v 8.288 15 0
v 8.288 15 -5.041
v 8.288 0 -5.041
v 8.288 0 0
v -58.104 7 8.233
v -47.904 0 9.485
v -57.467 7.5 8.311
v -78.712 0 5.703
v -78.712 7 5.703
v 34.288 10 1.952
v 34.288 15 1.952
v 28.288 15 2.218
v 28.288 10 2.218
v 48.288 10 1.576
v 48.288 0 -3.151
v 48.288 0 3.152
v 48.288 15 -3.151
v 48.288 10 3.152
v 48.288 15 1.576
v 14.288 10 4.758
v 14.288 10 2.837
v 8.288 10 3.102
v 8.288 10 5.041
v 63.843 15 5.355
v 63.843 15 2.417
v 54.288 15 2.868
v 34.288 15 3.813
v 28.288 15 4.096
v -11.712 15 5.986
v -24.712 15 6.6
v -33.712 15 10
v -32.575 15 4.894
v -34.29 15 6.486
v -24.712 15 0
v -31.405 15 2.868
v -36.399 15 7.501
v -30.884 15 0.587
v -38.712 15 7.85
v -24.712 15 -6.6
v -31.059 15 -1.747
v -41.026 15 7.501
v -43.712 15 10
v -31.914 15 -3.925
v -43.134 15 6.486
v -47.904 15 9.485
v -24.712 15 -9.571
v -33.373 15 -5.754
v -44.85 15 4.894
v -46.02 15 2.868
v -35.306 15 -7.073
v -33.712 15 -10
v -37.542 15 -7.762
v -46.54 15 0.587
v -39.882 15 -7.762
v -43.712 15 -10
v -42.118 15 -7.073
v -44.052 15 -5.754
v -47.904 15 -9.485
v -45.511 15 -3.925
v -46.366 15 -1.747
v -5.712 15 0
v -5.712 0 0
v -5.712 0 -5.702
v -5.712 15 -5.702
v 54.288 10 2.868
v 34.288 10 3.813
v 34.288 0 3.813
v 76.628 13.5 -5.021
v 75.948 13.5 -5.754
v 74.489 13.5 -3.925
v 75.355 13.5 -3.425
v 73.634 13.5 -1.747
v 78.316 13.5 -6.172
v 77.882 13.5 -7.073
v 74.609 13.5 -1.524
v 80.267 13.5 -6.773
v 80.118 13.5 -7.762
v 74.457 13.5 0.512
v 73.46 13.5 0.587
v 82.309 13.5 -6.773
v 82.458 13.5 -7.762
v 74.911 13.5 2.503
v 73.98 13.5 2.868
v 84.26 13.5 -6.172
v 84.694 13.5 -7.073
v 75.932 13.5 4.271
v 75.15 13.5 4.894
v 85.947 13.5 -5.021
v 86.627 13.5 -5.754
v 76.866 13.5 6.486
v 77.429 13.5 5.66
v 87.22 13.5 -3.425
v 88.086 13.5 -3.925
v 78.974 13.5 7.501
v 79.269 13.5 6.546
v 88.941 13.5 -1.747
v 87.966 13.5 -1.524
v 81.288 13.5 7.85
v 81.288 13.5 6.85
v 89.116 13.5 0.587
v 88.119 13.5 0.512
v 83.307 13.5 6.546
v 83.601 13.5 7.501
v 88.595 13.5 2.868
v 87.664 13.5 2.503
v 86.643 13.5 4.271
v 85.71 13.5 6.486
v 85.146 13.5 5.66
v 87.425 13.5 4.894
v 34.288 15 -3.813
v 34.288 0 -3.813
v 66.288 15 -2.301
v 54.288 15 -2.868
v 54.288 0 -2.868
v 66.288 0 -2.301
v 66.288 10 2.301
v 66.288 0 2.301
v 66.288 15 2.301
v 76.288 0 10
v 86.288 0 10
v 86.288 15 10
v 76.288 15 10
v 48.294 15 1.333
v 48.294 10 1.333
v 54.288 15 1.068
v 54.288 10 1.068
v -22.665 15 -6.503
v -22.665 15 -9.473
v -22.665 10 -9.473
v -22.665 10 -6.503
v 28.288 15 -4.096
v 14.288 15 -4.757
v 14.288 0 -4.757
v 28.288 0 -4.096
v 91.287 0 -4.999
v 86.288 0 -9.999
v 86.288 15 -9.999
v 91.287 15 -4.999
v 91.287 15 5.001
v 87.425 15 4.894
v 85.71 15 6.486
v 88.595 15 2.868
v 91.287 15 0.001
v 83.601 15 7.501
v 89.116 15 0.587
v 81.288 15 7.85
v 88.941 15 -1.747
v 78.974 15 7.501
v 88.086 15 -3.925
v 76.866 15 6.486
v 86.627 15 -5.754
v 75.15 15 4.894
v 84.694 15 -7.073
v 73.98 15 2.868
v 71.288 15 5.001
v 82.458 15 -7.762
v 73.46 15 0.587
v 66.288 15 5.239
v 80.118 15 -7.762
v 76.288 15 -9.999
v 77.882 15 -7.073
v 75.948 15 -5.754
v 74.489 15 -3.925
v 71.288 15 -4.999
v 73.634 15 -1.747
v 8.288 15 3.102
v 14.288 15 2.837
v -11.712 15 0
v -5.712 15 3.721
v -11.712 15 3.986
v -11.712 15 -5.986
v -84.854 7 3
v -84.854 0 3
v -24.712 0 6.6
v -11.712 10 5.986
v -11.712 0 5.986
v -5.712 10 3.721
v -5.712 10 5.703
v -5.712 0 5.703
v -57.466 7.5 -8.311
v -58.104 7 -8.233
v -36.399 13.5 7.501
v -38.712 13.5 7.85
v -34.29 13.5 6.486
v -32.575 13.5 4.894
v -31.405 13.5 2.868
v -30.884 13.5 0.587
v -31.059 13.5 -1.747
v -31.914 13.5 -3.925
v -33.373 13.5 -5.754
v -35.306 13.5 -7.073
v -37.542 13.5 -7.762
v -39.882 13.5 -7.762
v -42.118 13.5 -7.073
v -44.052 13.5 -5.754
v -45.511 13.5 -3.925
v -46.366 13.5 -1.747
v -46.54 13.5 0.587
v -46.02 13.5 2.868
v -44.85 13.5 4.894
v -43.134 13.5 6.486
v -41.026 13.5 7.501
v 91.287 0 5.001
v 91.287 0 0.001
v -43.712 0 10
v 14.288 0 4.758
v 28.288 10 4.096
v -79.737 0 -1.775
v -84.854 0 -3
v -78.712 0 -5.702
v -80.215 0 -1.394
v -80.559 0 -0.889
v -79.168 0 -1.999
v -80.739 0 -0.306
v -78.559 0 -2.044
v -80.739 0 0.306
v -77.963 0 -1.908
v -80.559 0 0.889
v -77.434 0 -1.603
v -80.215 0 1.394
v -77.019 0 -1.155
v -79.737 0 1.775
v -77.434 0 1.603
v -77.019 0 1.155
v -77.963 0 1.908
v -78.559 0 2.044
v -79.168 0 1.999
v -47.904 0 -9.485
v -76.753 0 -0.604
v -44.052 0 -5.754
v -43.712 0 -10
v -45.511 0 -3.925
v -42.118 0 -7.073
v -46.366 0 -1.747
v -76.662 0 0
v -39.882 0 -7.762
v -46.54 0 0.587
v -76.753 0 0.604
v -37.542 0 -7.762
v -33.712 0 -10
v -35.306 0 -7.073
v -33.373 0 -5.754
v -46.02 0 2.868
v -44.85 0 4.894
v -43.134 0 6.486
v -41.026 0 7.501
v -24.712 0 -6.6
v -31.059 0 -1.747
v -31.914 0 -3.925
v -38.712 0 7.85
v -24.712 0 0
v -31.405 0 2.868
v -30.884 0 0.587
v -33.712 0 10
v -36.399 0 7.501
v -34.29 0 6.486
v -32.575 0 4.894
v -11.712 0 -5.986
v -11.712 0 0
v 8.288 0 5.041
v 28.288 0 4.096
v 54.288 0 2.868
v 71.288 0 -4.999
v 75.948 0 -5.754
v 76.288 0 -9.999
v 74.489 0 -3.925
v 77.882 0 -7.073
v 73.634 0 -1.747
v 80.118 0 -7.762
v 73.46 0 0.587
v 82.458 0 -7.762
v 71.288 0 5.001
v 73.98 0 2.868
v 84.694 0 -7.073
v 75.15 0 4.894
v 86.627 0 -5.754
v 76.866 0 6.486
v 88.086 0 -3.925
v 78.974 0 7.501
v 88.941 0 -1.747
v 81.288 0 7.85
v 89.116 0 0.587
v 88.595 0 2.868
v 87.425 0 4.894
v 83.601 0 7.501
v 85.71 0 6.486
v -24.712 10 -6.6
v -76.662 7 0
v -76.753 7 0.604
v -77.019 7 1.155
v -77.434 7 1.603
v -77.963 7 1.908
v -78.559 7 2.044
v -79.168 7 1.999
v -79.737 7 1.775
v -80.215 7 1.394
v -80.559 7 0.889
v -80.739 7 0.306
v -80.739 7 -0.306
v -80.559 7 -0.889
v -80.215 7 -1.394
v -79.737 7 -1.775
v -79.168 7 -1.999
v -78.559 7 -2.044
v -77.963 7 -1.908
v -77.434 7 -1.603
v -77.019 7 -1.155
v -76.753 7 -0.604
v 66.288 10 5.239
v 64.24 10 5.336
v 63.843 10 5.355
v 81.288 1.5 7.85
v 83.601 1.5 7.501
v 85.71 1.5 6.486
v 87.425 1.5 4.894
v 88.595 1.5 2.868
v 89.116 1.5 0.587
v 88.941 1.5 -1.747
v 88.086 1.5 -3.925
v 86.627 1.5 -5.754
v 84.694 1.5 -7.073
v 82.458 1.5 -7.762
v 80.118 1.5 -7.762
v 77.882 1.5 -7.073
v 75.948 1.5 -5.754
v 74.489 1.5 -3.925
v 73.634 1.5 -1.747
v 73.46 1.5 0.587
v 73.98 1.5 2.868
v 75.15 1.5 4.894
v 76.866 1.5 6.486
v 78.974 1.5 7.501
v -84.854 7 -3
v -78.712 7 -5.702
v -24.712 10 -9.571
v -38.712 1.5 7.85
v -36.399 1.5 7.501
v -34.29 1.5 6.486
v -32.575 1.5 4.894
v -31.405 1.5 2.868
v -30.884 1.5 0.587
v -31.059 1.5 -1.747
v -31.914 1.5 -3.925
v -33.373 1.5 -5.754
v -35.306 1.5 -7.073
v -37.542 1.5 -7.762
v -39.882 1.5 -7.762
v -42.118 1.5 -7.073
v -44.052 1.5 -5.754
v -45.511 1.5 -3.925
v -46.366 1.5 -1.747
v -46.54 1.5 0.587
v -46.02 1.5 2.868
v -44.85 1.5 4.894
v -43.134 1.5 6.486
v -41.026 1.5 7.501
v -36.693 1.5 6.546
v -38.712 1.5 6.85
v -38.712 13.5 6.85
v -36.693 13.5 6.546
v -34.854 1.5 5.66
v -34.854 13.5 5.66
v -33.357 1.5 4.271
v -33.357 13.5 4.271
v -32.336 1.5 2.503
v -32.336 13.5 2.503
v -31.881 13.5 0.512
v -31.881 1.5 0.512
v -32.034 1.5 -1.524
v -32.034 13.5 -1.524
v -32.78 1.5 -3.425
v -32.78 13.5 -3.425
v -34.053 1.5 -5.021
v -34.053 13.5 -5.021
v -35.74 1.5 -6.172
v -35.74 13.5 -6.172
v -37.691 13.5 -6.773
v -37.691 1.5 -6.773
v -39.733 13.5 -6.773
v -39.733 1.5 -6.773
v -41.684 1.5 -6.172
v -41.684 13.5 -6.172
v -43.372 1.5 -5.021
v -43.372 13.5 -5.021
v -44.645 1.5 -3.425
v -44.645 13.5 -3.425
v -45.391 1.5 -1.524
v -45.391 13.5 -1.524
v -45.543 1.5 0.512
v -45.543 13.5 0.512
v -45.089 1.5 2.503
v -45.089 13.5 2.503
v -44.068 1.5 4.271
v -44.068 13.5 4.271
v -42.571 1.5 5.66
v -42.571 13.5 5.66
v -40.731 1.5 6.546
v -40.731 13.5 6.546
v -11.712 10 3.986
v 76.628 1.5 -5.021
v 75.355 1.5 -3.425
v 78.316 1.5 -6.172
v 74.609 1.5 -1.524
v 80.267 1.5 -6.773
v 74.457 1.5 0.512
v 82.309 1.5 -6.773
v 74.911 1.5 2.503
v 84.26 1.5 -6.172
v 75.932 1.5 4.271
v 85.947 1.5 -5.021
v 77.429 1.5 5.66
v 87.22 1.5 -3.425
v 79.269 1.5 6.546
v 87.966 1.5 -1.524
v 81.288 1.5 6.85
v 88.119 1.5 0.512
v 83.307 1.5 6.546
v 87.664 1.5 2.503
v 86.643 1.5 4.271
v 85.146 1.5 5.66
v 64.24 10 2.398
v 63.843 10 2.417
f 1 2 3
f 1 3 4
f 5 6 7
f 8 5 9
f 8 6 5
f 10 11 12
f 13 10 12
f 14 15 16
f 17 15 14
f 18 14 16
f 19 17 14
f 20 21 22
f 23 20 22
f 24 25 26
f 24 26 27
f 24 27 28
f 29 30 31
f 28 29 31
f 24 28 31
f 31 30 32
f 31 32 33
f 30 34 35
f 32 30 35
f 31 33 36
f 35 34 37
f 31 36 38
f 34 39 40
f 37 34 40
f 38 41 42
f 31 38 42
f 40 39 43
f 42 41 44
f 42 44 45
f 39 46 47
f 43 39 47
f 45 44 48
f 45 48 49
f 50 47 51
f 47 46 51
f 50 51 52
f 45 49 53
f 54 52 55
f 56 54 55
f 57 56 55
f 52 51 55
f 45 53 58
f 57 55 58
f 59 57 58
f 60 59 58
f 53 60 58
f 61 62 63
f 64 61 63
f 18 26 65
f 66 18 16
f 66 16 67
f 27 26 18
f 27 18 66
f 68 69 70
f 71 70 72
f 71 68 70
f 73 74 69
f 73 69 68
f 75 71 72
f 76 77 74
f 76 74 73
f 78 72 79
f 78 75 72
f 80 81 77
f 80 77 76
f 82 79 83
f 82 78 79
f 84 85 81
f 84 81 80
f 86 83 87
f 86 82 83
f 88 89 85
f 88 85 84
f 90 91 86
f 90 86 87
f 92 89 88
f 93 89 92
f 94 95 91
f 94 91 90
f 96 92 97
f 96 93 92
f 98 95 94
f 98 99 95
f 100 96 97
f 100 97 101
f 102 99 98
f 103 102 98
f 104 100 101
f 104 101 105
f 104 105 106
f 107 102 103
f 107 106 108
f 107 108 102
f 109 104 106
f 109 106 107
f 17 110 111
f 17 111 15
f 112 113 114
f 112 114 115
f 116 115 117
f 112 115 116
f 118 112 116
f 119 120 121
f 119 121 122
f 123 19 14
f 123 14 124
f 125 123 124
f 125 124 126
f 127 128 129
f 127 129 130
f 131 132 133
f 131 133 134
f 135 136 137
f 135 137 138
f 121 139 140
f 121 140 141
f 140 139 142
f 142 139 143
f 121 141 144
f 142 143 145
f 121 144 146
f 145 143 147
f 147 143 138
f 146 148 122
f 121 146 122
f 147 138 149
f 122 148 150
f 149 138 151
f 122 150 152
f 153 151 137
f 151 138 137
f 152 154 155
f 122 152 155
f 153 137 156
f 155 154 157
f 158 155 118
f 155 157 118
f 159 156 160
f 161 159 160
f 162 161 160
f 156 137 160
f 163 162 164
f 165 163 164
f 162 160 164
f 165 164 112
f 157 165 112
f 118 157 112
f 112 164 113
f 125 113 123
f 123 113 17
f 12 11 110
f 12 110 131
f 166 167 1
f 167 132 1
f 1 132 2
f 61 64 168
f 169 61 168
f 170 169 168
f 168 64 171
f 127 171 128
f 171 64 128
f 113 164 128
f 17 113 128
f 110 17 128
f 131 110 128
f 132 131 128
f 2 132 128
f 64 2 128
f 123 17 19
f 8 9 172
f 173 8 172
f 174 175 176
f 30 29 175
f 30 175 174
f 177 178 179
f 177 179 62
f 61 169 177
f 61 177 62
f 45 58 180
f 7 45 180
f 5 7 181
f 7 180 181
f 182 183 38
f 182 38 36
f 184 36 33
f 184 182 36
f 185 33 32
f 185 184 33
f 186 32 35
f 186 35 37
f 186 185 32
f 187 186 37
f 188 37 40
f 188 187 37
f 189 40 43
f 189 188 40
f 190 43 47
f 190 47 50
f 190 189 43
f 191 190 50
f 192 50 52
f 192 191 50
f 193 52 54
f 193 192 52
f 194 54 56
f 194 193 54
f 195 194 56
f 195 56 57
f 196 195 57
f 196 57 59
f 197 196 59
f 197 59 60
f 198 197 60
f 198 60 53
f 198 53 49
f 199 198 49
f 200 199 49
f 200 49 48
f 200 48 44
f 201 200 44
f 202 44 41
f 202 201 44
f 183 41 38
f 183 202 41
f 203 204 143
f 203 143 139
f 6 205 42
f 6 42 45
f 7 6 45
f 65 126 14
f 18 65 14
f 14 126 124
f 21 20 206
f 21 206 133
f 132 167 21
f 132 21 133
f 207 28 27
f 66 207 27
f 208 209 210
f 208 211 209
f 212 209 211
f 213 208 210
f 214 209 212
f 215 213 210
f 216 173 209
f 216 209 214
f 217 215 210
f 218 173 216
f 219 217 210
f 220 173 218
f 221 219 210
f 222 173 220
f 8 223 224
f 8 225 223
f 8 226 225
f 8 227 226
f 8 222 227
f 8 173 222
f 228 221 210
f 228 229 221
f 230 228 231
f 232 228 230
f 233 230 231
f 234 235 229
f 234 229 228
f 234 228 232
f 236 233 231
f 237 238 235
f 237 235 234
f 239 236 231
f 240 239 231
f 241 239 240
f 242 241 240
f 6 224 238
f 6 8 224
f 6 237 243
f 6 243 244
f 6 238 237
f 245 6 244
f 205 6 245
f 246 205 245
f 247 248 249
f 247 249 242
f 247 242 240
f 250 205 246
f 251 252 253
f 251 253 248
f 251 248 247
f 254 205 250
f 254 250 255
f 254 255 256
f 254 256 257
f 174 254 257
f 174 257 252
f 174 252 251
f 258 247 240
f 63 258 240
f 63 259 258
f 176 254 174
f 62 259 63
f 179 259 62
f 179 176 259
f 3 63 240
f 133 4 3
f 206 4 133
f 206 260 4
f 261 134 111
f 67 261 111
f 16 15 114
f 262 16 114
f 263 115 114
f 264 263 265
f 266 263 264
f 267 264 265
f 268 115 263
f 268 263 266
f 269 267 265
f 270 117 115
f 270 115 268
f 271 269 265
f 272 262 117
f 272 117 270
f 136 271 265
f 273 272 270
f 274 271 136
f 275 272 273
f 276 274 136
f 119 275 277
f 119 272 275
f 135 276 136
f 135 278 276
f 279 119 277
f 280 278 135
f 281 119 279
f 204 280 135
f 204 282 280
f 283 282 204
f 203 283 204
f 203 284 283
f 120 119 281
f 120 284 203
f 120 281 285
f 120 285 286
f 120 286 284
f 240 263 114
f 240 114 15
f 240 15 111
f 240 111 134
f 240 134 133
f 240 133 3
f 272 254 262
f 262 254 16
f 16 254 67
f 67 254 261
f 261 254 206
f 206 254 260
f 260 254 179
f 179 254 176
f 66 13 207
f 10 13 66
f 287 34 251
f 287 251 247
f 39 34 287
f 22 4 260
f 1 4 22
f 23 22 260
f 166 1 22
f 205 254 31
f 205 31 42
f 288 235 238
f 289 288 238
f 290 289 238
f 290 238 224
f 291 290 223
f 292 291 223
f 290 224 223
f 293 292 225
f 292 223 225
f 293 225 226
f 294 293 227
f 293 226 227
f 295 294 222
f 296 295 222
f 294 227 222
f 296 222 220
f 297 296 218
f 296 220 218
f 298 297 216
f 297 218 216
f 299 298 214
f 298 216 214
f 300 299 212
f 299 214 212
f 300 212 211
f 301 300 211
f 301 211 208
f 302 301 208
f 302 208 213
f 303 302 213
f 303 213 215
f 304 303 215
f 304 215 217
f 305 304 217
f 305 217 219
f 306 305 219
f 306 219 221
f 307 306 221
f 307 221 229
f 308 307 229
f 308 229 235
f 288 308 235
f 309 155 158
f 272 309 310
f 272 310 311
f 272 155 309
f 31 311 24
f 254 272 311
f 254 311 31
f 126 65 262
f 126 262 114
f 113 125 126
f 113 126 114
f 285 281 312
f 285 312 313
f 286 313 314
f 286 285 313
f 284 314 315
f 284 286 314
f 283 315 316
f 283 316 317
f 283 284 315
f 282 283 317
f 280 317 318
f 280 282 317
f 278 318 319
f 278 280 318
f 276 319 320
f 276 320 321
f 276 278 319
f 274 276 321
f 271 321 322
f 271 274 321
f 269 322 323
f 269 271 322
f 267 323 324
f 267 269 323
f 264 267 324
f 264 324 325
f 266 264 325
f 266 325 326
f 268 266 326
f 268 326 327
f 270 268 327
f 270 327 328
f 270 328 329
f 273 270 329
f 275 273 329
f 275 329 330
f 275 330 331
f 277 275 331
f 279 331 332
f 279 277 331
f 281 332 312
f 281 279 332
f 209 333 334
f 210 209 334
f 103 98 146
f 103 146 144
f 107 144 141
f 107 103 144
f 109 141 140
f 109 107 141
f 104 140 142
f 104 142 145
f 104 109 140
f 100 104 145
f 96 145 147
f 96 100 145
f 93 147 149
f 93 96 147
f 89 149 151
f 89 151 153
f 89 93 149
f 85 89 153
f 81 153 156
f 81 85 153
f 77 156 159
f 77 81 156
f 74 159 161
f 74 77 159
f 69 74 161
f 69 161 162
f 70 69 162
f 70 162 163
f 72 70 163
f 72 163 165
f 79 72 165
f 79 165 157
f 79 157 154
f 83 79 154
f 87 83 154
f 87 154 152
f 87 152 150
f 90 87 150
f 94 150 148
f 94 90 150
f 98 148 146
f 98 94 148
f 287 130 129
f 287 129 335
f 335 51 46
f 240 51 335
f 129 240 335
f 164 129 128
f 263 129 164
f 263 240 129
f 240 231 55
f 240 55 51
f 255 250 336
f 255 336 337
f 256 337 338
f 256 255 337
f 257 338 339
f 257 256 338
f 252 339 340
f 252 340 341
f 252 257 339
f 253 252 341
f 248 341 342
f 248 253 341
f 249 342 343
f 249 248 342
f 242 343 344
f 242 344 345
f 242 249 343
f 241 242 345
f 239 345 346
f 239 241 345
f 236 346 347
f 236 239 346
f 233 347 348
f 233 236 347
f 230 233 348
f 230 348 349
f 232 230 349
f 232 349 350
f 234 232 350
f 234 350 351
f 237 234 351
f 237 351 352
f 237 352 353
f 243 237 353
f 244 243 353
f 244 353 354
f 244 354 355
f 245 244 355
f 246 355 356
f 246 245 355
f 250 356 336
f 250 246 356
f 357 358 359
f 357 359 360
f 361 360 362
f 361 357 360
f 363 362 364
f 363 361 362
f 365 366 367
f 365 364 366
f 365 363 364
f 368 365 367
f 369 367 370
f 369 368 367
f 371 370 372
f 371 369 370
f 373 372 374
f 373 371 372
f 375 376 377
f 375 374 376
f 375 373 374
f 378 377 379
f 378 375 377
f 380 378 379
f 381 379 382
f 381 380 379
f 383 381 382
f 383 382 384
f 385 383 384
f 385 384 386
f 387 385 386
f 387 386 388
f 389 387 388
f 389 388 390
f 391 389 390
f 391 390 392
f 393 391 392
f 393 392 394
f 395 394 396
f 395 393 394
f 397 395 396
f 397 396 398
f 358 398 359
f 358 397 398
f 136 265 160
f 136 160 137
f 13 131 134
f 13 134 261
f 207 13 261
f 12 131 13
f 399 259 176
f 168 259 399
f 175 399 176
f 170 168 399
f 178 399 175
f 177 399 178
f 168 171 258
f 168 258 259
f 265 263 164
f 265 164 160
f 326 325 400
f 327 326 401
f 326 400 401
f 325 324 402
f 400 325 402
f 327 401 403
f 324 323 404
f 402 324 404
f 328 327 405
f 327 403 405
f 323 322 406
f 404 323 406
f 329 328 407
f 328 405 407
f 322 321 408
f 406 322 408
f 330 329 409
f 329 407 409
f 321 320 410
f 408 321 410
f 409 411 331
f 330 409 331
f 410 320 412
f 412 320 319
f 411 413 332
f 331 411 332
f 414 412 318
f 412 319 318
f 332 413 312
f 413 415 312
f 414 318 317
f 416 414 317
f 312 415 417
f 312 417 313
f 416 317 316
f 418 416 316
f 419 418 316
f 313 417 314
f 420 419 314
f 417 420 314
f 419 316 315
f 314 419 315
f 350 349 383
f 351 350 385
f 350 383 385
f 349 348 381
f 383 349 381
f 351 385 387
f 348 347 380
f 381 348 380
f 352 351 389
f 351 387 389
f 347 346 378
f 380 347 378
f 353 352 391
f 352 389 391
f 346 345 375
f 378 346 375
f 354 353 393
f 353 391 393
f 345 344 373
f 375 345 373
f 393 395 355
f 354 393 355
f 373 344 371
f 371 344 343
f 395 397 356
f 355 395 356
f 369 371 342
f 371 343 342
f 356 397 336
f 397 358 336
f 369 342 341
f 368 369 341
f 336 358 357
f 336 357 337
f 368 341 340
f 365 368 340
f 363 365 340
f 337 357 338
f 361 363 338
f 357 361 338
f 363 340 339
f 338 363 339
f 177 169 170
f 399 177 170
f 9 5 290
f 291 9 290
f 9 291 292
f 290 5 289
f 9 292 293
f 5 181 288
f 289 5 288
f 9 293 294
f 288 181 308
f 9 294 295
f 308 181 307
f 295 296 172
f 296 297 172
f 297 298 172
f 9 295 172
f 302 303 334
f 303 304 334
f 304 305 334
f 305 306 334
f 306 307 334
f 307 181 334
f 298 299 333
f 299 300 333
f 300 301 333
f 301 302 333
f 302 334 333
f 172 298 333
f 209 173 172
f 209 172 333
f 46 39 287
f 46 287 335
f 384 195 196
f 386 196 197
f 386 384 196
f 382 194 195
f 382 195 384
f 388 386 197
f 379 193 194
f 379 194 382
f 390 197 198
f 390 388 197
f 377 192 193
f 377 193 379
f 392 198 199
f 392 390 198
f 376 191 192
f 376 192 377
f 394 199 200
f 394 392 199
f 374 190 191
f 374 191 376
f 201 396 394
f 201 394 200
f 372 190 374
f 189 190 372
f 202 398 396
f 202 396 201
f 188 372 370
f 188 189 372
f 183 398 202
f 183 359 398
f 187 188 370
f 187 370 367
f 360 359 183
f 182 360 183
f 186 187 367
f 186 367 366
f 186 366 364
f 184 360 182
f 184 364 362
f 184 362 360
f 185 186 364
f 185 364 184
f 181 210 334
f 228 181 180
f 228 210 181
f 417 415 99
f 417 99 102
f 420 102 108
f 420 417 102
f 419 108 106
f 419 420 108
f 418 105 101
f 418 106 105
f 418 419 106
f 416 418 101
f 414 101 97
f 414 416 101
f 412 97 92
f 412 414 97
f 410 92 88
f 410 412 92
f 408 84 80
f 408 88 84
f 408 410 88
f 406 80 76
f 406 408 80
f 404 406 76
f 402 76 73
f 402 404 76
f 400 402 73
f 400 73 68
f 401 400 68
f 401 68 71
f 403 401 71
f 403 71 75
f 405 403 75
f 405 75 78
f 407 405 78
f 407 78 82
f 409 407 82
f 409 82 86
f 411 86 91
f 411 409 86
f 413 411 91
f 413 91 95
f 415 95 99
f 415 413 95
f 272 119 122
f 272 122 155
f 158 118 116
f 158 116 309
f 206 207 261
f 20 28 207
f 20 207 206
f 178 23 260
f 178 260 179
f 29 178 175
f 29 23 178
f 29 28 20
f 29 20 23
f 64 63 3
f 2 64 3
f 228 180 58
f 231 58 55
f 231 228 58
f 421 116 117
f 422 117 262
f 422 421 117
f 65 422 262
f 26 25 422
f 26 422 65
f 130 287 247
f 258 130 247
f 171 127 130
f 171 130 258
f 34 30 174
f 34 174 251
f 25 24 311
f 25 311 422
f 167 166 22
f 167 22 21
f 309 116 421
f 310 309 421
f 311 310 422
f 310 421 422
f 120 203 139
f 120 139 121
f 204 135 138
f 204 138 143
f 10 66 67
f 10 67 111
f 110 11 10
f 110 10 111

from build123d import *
from OCP.BRepAlgoAPI import BRepAlgoAPI_Cut
from OCP.TopTools import TopTools_ListOfShape
from build123d.topology import SkipClean

# Parameters (mm, degrees)
SKETCH1_R           = 2.05
SKETCH1_R_2         = 6.85
BOSS_EXTRUDE1_DEPTH = 15
SKETCH1_3_R         = 7.85
CUT_EXTRUDE1_DEPTH  = 1.5
CUT_EXTRUDE2_START  = 13.5
SKETCH1_4_R         = 7.85
CUT_EXTRUDE2_DEPTH  = 1.5
CUT_EXTRUDE18_DEPTH = 15
CUT_EXTRUDE19_DEPTH = 15
CUT_EXTRUDE20_DEPTH = 5
CUT_EXTRUDE21_DEPTH = 25
BOSS_EXTRUDE2_START = 8
SKETCH9_R           = 2.05
BOSS_EXTRUDE2_DEPTH = 8
CUT_EXTRUDE22_DEPTH = 30


with BuildPart() as part:
    # Sketch1 → Boss-Extrude1 (new body)
    with BuildSketch(Plane(origin=(0, 0, 0), x_dir=(1, 0, 0), z_dir=(0, 1, 0))):
        Polygon((91.286914415, -0.000755057), (91.286914415, -5.000755057), (86.287669472, -10), (76.287669472, -10), (71.288424529, -5.000755057), (-33.712330528, -10), (-43.712330528, -10), (-78.712330528, -5.702540368), (-84.854022115, -3), (-84.854022115, 0), (-84.853996395, 3), (-78.712281638, 5.702487713), (-43.712244796, 9.999647278), (-33.712244796, 9.999561545), (71.288467397, 4.999416396), (76.2877552, 9.998618479), (86.287755199, 9.998532746), (91.286957282, 4.999244943), align=None)
        with Locations(Location((-78.712330528, 0, 0), (0, 0, 270))):
            Circle(SKETCH1_R, mode=Mode.SUBTRACT)
        with Locations(Location((81.287669472, 0, 0), (0, 0, 270))):
            Circle(SKETCH1_R_2, mode=Mode.SUBTRACT)
        with Locations(Location((-38.712330528, 0, 0), (0, 0, 270))):
            Circle(SKETCH1_R_2, mode=Mode.SUBTRACT)
    extrude(amount=BOSS_EXTRUDE1_DEPTH)

    # Sketch1<3> → Cut-Extrude1 (cut)
    with BuildSketch(Plane(origin=(0, 0, 0), x_dir=(1, 0, 0), z_dir=(0, 1, 0))):
        with Locations(Location((-38.712330528, 0, 0), (0, 0, 270))):
            Circle(SKETCH1_3_R)
        with Locations(Location((81.287669472, 0, 0), (0, 0, 270))):
            Circle(SKETCH1_3_R)
    extrude(amount=CUT_EXTRUDE1_DEPTH, mode=Mode.SUBTRACT)

    # Sketch1<4> → Cut-Extrude2 (cut)
    with BuildSketch(Plane(origin=(0, 0, 0), x_dir=(1, 0, 0), z_dir=(0, 1, 0)).offset(CUT_EXTRUDE2_START)):
        with Locations(Location((-38.712330528, 0, 0), (0, 0, 270))):
            Circle(SKETCH1_4_R)
        with Locations(Location((81.287669472, 0, 0), (0, 0, 270))):
            Circle(SKETCH1_4_R)
    extrude(amount=CUT_EXTRUDE2_DEPTH, mode=Mode.SUBTRACT)

    # Sketch2 → Cut-Extrude18 (cut)
    with BuildSketch(Plane(origin=(0, 15, 0), x_dir=(1, 0, 0), z_dir=(0, 1, 0))):
        Polygon((-24.712374044, 6.599650564), (-11.712369995, 5.985582494), (-11.712330529, -0.000306581), (-11.712330529, -5.986195656), (-24.712330529, -6.600349436), (-24.712330529, -0.000349436), align=None)
        Polygon((-5.712330529, -0.000286801), (-5.712368126, 5.702166462), (8.287636234, 5.040862387), (8.287669471, -0.000240649), (8.287669471, -5.041343686), (-5.712330529, -5.702740065), align=None)
    extrude(amount=-CUT_EXTRUDE18_DEPTH, mode=Mode.SUBTRACT)

    # Sketch5 → Cut-Extrude19 (cut)
    with BuildSketch(Plane(origin=(0, 15, 0), x_dir=(1, 0, 0), z_dir=(0, 1, 0))):
        Polygon((14.287669471, -4.757888095), (14.287638103, 4.757446355), (28.287642463, 4.09614228), (28.287669471, -4.096491716), align=None)
        Polygon((34.287644332, 3.812726248), (48.287648692, 3.151422173), (48.287669471, -3.151639747), (34.287669471, -3.813036126), align=None)
        Polygon((54.287650561, 2.868006141), (66.2876543, 2.301174077), (66.287669472, -2.301272974), (54.287669471, -2.868184156), align=None)
    extrude(amount=-CUT_EXTRUDE19_DEPTH, mode=Mode.SUBTRACT)


with BuildPart() as cut_extrude20_tool:
    # Sketch6 → Cut-Extrude20 (new body)
    with BuildSketch(Plane(origin=(0, 15, 0), x_dir=(1, 0, 0), z_dir=(0, 1, 0))):
        Polygon((-24.712374044, 9.570986737), (-22.664694465, 9.473476016), (-22.664694465, 6.50292639), (-24.712374044, 6.599650564), align=None)
        Polygon((64.239989057, -2.398010718), (66.287669472, -2.301272974), (66.287669472, -5.238848578), (64.239989057, -5.336341743), (63.843088459, -5.355238781), (63.843088459, -2.416761333), align=None)
        Polygon((54.287669471, -1.068184156), (54.287669471, -2.868184156), (48.287669471, -3.151639747), (48.287669471, -1.575940198), (48.294422194, -1.333159375), align=None)
        Polygon((34.287669471, -1.952430065), (28.287669471, -2.217703838), (28.287669471, -4.096491716), (34.287669471, -3.813036126), align=None)
        Polygon((8.287669471, -3.101949747), (14.287669471, -2.836675974), (14.287669471, -4.757888095), (8.287669471, -5.041343686), align=None)
        Polygon((-5.712330529, -3.720921883), (-11.712330529, -3.986195656), (-11.712330529, -5.986195656), (-5.712330529, -5.702740065), align=None)
    extrude(amount=-CUT_EXTRUDE20_DEPTH)


with BuildPart() as part_1:
    add(part.part)

    # Cut-Extrude20: cut by cut_extrude20_tool, with a tolerance
    cut_extrude20_stock = TopTools_ListOfShape()
    cut_extrude20_stock.Append(part_1.part.wrapped)
    cut_extrude20_tools = TopTools_ListOfShape()
    cut_extrude20_tools.Append(cut_extrude20_tool.part.wrapped)
    cut_extrude20_cut = BRepAlgoAPI_Cut()
    cut_extrude20_cut.SetArguments(cut_extrude20_stock)
    cut_extrude20_cut.SetTools(cut_extrude20_tools)
    cut_extrude20_cut.SetFuzzyValue(0.00001)
    cut_extrude20_cut.Build()
    add(Compound.cast(cut_extrude20_cut.Shape()).solids(), mode=Mode.REPLACE)

    # Sketch8 → Cut-Extrude21 (cut)
    with BuildSketch(Plane.XY.offset(10)):
        Polygon((-47.904022115, 0), (-58.104022115, 8), (-84.854022115, 8), (-84.854022115, 0), align=None)
    extrude(amount=-CUT_EXTRUDE21_DEPTH, mode=Mode.SUBTRACT)

    # Sketch9 → Boss-Extrude2 (add)
    with SkipClean():  # the faces are left unmerged after this step: merging them gives an invalid solid
        with BuildSketch(Plane.XZ.offset(-8).offset(BOSS_EXTRUDE2_START)):
            Polygon((-84.854022115, 3), (-84.853996395, -3), (-78.712281638, -5.702487713), (-47.032796515, -9.591963691), (-47.380824321, 9.5495656), (-78.712330528, 5.702540368), align=None)
            with Locations((-78.712330528, 0)):
                Circle(SKETCH9_R, mode=Mode.SUBTRACT)
        extrude(amount=-BOSS_EXTRUDE2_DEPTH)

    # Sketch10 → Cut-Extrude22 (cut)
    with BuildSketch(Plane(origin=(8.5727e-05, 0, -9.999272518), x_dir=(-0.9999999999632491, 0, -8.573327994754198e-06), z_dir=(8.573327994754198e-06, 0, -0.9999999999632491))):
        Polygon((47.904022112, 15), (58.104022112, 7), (84.854022112, 7), (84.854022112, 15), align=None)
    extrude(amount=-CUT_EXTRUDE22_DEPTH, mode=Mode.SUBTRACT)


solid = part_1.part
